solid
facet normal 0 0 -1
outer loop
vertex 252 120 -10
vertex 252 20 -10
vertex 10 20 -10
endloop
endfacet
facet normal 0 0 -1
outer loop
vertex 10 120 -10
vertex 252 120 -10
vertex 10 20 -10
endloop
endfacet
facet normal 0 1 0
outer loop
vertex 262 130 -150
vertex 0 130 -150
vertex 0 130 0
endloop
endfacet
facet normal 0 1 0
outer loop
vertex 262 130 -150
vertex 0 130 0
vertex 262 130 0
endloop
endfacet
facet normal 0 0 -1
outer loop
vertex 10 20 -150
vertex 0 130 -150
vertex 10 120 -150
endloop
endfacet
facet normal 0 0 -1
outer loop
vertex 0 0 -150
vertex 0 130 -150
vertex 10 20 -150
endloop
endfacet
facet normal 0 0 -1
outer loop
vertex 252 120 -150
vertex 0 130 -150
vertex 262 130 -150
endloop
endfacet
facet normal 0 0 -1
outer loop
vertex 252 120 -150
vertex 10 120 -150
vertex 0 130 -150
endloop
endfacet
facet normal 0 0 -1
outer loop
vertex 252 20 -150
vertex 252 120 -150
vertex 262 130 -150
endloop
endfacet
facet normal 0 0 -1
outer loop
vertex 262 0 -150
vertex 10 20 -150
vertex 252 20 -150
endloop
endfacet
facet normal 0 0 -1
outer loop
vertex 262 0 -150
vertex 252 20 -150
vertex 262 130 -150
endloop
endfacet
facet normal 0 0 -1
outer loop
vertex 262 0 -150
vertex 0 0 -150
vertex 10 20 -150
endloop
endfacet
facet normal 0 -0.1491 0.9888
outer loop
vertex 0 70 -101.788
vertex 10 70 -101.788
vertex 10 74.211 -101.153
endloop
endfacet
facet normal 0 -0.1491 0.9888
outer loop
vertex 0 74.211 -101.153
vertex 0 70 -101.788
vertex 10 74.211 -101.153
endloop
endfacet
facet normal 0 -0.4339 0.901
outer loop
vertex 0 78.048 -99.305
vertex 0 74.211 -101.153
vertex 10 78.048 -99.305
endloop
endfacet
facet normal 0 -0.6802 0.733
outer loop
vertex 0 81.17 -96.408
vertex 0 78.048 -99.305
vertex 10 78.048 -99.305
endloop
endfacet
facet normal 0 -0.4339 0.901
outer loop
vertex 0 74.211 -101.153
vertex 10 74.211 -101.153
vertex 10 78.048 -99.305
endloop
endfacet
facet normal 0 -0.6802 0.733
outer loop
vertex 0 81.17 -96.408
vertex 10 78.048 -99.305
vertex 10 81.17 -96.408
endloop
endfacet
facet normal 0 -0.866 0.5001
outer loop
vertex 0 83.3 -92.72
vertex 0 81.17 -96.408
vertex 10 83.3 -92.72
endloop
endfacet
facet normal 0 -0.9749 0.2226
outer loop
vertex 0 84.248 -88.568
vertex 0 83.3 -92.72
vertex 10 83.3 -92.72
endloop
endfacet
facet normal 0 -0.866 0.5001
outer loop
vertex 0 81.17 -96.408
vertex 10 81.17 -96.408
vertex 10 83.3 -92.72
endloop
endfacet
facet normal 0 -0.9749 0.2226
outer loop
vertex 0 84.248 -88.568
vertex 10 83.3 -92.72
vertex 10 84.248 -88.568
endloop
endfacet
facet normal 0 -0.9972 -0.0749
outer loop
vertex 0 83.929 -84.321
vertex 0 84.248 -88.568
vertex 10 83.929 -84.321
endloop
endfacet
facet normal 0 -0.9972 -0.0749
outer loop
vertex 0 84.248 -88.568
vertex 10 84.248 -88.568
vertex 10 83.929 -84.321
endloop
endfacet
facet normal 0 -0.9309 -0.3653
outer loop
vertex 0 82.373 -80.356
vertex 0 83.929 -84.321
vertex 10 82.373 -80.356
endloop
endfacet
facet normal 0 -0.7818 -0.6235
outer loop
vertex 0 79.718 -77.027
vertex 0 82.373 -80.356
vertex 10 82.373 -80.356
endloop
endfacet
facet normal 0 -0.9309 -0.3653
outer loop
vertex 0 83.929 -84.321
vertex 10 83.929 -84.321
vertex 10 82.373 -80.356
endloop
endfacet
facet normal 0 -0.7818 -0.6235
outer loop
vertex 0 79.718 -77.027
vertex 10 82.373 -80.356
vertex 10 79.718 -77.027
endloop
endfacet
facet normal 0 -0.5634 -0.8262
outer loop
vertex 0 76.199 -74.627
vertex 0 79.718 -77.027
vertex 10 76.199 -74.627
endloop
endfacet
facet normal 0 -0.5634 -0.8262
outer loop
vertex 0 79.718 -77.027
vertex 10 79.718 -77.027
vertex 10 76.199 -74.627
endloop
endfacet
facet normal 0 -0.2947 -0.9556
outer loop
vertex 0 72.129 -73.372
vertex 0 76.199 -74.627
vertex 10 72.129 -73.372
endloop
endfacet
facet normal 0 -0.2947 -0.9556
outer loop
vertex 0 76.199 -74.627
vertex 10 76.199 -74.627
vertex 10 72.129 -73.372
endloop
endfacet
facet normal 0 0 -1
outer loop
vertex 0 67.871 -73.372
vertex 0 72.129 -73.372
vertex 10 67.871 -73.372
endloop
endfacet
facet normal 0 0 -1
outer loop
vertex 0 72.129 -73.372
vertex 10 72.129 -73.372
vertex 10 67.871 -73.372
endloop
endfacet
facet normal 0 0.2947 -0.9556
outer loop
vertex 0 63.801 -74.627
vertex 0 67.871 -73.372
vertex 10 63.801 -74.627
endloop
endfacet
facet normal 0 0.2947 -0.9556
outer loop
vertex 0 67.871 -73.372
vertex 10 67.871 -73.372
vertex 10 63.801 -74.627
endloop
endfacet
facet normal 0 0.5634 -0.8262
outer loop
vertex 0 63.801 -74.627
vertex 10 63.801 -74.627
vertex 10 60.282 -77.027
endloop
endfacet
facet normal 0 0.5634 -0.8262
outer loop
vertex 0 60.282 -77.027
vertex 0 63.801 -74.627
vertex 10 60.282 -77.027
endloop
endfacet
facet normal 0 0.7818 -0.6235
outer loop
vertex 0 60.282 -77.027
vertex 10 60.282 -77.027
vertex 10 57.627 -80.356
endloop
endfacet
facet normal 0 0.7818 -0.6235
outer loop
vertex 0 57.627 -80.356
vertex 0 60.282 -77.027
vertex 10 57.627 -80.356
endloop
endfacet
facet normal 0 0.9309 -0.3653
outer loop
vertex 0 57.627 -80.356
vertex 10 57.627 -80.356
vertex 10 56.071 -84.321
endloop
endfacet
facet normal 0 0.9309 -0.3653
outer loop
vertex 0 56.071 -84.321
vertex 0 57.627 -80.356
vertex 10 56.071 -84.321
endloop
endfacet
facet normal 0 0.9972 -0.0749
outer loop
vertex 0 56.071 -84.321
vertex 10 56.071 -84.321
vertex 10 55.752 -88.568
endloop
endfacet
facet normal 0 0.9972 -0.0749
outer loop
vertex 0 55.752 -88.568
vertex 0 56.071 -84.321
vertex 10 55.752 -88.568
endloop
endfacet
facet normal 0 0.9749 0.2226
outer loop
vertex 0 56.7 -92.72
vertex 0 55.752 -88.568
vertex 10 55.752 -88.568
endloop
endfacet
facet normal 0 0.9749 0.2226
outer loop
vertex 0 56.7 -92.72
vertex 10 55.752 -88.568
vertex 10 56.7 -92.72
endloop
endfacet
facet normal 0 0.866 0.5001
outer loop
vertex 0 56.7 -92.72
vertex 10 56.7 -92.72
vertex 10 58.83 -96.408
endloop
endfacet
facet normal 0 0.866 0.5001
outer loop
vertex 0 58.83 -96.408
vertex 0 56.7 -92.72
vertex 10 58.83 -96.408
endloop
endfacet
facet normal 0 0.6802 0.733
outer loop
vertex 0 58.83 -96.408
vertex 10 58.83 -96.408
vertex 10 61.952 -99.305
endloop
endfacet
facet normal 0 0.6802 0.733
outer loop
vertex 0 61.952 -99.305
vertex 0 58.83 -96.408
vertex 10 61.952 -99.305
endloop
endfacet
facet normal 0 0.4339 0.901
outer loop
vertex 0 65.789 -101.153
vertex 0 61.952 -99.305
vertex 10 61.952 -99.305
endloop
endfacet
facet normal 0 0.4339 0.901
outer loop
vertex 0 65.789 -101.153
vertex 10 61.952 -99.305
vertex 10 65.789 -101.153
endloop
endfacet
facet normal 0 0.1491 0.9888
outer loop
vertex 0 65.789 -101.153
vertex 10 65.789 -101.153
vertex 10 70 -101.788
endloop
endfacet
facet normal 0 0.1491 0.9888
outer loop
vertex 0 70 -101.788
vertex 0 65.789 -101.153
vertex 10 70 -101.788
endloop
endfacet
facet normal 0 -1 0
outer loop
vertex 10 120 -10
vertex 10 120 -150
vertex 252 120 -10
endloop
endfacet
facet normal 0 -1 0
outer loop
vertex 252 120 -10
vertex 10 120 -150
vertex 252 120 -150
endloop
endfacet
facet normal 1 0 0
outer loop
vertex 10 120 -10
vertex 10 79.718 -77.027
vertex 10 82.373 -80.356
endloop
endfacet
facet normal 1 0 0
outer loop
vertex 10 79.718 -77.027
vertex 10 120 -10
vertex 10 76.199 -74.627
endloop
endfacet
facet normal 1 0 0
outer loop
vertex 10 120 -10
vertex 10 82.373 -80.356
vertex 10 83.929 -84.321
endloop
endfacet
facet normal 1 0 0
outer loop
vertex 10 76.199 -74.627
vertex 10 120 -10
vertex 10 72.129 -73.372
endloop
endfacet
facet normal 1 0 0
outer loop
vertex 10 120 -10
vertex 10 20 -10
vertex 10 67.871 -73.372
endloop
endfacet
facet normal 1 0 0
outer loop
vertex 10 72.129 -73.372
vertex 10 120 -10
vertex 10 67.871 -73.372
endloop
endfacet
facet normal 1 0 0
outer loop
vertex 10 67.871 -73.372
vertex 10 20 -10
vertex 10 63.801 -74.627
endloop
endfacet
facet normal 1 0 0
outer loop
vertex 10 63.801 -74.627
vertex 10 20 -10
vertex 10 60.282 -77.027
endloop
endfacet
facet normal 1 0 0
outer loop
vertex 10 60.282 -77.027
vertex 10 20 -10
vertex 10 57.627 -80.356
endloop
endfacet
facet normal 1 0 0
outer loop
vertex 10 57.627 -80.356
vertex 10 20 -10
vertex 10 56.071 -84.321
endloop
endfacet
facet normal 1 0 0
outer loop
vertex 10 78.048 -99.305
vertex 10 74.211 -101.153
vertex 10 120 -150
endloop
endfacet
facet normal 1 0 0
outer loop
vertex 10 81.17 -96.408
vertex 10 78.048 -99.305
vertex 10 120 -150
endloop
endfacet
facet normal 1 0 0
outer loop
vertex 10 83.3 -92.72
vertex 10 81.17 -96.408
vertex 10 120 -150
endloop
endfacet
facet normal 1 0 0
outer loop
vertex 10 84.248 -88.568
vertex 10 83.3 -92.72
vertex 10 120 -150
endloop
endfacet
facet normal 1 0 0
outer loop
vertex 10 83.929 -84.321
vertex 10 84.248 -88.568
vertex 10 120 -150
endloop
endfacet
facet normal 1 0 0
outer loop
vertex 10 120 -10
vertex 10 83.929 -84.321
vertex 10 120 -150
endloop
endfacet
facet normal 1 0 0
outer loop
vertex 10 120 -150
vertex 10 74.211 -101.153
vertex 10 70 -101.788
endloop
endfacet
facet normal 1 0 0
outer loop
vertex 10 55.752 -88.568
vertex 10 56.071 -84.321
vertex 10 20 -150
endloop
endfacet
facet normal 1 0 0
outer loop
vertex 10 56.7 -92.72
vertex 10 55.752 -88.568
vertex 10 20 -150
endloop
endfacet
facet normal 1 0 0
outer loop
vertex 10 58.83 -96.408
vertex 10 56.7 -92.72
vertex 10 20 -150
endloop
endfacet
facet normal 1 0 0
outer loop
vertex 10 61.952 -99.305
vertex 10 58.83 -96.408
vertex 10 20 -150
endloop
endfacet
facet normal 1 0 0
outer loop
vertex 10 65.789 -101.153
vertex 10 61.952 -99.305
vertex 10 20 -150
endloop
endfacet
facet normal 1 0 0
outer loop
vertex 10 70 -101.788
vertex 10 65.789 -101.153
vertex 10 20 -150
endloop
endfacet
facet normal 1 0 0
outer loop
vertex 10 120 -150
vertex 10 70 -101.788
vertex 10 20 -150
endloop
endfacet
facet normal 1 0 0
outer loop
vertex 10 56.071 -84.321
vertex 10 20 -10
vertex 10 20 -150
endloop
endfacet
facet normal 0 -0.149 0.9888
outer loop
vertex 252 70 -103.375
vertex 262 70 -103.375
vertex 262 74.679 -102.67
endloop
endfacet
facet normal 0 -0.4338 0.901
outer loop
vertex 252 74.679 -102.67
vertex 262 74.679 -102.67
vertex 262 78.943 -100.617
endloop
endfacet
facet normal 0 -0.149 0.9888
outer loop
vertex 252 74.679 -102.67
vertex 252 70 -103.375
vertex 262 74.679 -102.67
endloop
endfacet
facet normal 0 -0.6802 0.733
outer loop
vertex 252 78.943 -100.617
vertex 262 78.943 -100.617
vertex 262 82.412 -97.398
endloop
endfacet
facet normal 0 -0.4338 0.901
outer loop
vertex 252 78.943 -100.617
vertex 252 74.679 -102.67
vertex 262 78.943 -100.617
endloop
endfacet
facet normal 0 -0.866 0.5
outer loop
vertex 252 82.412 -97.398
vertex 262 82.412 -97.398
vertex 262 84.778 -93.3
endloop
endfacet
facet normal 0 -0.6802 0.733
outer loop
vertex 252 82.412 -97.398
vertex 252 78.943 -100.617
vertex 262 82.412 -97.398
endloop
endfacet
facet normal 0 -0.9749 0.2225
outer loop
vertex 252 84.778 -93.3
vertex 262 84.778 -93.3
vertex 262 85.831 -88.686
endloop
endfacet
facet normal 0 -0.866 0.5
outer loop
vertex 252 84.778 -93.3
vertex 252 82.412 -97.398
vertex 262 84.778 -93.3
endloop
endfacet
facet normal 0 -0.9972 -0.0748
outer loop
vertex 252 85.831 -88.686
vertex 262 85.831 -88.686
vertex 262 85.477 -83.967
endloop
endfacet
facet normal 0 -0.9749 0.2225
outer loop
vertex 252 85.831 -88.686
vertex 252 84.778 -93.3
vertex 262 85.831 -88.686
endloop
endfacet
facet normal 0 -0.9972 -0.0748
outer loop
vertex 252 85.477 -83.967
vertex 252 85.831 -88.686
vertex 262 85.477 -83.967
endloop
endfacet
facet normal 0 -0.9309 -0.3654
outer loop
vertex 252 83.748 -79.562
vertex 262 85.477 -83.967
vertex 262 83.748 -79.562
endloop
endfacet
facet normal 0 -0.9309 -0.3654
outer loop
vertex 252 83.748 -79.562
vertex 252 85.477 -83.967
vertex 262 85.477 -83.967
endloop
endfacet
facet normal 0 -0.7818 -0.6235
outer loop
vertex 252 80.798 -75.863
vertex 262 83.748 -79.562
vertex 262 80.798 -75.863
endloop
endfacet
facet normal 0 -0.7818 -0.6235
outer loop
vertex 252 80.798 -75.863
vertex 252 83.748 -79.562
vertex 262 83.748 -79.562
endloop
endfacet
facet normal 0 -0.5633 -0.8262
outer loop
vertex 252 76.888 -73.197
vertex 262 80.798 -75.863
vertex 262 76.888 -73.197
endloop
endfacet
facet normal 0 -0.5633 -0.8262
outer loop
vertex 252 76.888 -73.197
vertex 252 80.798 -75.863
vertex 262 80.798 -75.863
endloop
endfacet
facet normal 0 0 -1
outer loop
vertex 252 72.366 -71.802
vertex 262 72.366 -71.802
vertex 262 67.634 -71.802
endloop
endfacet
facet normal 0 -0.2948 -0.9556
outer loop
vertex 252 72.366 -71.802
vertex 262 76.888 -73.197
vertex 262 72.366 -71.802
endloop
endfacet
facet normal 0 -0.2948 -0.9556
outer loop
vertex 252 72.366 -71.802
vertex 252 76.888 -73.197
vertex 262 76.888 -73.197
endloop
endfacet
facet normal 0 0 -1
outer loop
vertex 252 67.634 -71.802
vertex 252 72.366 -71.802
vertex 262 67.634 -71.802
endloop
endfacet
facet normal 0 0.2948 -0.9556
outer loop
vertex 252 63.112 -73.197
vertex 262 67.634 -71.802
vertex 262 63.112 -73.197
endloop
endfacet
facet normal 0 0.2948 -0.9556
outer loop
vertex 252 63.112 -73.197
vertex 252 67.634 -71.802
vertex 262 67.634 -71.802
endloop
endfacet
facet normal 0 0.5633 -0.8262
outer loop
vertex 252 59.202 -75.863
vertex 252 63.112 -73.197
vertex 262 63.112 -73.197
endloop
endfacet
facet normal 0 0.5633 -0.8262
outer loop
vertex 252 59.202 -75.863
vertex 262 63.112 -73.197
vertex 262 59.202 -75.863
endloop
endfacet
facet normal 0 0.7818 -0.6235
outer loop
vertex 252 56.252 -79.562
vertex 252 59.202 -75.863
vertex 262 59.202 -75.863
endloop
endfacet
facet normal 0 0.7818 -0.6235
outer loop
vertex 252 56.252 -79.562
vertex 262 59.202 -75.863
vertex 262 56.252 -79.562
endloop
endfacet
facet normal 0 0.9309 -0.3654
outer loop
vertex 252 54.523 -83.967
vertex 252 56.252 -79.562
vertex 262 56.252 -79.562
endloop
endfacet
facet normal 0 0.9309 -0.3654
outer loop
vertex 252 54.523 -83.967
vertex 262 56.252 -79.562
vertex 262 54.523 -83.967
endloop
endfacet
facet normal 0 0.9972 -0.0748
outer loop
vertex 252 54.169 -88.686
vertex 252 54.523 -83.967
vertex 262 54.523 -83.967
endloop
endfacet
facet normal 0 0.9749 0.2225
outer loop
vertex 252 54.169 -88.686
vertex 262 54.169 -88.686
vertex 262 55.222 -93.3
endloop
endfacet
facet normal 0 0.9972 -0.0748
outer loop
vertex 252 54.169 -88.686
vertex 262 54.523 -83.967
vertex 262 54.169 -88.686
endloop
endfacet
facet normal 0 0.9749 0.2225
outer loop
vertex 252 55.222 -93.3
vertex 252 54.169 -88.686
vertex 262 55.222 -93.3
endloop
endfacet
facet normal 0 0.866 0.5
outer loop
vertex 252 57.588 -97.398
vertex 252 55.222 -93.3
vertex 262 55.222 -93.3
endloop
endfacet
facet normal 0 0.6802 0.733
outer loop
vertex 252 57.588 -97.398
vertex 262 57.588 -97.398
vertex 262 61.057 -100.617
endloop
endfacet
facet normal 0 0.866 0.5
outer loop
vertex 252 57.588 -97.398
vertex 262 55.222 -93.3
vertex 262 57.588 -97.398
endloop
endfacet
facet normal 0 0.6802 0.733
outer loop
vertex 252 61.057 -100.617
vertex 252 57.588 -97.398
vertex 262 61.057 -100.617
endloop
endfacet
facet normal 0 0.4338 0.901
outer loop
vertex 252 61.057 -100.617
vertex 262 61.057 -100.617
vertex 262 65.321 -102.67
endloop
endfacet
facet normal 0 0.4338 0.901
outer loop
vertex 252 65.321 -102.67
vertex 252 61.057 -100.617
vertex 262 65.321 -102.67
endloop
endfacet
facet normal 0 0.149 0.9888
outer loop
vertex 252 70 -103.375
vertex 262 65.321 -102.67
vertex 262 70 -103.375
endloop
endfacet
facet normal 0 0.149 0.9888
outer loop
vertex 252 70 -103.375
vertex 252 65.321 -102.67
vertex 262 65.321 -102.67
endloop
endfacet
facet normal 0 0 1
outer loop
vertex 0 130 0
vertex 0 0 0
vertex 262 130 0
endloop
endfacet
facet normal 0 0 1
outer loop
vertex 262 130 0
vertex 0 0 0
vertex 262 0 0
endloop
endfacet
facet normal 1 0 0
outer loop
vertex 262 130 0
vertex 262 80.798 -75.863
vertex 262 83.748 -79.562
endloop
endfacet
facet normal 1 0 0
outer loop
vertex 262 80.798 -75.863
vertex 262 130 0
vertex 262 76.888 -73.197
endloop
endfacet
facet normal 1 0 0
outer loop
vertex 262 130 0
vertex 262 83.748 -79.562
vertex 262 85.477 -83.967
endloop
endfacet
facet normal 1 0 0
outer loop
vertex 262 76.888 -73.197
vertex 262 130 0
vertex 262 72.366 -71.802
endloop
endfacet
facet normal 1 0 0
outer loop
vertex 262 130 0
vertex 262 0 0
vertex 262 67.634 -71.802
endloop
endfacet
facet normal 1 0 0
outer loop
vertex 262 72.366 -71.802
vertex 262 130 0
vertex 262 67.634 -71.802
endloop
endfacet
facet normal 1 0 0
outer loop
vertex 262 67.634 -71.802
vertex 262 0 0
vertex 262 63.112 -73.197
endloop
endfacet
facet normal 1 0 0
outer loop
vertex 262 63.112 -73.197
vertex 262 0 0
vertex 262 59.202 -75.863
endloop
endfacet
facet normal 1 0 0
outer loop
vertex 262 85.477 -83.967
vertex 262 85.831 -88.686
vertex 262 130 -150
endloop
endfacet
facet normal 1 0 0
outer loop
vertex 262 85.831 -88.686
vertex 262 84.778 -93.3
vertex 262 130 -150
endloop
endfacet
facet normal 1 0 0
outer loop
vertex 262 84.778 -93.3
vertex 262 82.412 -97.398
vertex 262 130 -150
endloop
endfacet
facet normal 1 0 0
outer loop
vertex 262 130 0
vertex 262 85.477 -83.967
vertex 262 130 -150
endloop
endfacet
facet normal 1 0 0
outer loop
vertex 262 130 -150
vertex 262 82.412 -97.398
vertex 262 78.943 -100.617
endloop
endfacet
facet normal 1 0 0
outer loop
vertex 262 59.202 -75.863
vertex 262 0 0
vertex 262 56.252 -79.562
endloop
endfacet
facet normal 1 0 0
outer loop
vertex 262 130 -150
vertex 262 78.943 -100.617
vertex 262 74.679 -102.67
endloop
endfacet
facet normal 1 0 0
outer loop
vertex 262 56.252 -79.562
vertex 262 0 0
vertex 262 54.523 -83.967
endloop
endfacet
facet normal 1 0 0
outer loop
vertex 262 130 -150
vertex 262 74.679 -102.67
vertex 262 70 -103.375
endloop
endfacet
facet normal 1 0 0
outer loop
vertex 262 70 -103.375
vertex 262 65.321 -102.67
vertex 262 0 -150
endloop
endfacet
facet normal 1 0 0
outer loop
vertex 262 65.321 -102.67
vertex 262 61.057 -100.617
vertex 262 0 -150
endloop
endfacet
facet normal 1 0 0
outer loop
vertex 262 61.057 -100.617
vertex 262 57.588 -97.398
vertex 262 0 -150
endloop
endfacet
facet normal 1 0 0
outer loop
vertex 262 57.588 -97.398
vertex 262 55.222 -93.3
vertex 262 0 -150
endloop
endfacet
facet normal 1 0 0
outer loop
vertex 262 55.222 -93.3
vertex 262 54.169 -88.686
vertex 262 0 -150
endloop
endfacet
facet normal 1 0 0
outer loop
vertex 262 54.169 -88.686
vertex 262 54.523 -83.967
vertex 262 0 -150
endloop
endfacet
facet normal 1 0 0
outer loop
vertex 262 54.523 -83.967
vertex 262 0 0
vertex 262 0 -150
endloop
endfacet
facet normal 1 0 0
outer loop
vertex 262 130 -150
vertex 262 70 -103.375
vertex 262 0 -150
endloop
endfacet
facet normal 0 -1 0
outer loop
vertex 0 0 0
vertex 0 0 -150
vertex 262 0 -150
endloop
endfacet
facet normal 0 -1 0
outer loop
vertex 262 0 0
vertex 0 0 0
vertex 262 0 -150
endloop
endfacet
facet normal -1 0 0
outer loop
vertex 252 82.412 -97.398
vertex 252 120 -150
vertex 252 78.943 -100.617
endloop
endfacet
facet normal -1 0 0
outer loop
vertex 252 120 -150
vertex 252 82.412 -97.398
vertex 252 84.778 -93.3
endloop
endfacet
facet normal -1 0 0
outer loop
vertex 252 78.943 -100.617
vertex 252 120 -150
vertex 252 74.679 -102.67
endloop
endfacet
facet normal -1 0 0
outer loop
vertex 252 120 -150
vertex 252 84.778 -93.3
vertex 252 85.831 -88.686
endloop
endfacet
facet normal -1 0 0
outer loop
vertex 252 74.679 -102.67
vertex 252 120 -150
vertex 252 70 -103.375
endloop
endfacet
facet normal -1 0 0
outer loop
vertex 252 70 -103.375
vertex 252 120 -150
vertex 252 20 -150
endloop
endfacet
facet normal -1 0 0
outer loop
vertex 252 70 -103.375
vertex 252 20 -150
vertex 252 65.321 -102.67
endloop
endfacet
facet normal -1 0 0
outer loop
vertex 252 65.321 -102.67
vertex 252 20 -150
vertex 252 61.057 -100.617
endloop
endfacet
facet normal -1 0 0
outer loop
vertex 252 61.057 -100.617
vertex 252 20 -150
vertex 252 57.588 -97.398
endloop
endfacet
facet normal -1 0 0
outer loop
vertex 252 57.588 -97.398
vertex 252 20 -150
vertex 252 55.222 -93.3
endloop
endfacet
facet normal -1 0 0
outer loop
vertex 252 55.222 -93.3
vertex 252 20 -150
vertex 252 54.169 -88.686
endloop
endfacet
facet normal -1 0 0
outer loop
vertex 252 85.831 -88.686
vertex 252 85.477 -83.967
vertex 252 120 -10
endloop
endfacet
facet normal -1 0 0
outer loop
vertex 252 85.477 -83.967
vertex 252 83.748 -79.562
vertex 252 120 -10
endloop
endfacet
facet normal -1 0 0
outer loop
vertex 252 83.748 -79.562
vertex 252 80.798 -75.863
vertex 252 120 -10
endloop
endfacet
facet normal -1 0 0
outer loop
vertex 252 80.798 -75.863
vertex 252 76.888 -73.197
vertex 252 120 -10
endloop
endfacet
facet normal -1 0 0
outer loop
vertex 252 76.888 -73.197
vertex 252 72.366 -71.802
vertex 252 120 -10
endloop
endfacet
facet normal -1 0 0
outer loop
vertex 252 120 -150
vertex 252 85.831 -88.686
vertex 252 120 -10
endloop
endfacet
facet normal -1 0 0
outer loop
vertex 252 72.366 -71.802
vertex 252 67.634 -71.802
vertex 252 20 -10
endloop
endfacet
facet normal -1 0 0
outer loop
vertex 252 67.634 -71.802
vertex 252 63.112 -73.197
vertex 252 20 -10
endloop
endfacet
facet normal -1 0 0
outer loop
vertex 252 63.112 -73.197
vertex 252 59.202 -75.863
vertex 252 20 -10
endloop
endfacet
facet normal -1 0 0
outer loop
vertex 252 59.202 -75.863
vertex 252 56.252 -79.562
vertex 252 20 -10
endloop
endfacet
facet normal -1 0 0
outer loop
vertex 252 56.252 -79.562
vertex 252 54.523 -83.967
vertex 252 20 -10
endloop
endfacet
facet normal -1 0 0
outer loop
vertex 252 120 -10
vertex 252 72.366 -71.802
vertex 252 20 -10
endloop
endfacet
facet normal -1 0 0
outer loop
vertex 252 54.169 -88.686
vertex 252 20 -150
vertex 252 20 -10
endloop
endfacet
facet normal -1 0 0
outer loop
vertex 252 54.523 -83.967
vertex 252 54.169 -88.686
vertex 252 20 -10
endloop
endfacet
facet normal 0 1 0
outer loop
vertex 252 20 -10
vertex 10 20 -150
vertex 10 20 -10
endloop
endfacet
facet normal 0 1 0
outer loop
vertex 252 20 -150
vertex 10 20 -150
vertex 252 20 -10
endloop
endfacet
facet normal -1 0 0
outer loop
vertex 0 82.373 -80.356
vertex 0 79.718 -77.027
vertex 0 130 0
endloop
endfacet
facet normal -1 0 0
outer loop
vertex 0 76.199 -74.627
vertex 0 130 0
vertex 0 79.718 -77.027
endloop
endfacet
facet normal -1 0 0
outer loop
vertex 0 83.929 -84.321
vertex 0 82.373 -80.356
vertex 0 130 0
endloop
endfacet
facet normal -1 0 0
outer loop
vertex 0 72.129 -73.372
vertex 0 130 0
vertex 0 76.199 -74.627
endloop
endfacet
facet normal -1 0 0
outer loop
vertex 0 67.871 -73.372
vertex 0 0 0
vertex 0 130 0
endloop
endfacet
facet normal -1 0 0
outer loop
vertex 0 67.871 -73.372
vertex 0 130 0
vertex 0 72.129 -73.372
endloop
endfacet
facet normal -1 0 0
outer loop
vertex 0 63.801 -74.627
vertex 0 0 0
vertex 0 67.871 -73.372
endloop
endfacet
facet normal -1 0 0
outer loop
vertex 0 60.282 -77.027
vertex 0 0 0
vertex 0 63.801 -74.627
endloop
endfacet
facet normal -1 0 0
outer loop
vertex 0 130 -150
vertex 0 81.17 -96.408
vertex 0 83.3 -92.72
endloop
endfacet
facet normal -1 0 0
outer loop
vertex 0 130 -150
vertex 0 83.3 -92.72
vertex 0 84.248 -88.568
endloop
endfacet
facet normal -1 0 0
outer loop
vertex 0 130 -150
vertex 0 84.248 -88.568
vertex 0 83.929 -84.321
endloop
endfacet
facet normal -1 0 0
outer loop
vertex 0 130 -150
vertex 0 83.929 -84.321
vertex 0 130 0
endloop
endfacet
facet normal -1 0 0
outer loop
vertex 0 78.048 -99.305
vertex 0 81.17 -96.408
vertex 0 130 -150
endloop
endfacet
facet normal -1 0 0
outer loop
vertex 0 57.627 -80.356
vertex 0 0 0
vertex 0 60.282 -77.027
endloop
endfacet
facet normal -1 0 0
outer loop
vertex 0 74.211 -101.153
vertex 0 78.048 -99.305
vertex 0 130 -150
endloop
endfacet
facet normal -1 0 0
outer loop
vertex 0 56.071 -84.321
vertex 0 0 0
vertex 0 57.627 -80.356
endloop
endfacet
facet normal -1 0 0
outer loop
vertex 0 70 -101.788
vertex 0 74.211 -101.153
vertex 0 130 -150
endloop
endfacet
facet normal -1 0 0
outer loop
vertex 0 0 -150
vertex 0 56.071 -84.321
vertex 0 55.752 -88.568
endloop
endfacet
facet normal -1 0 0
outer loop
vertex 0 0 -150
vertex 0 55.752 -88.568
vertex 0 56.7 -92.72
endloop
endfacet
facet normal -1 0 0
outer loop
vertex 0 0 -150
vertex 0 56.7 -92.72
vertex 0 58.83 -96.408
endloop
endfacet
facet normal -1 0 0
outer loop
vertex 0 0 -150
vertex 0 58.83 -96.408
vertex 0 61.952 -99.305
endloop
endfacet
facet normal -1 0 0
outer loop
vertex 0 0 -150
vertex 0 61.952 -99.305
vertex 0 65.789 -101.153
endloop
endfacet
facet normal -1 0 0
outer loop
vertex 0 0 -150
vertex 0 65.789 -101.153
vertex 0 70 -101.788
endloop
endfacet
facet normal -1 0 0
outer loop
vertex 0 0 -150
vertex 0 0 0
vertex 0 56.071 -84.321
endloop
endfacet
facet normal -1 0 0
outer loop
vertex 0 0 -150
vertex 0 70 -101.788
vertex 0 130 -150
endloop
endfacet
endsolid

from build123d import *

# Parameters (mm, degrees)
SKETCH1_W           = 262
SKETCH1_H           = 150
BOSS_EXTRUDE1_DEPTH = 20
BOSS_EXTRUDE2_DEPTH = 100
SKETCH3_R           = 14.2875
CUT_EXTRUDE1_DEPTH  = 11
SKETCH4_R           = 15.875
CUT_EXTRUDE2_DEPTH  = 11
SKETCH5_W           = 262
SKETCH5_H           = 150
BOSS_EXTRUDE4_DEPTH = 10


with BuildPart() as part:
    # Sketch1 → Boss-Extrude1 (new body)
    with BuildSketch(Plane(origin=(0, 0, 0), x_dir=(1, 0, 0), z_dir=(0, 1, 0))):
        with Locations((131, 75)):
            Rectangle(SKETCH1_W, SKETCH1_H)
    extrude(amount=BOSS_EXTRUDE1_DEPTH)

    # Sketch2 → Boss-Extrude2 (add)
    with BuildSketch(Plane(origin=(0, 20, 0), x_dir=(1, 0, 0), z_dir=(0, 1, 0))):
        Polygon((0, 0), (262, 0), (262, 150), (252, 150), (252, 10), (10, 10), (10, 150), (0, 150), align=None)
    extrude(amount=BOSS_EXTRUDE2_DEPTH)

    # Sketch3 → Cut-Extrude1 (cut, through all)
    with BuildSketch(Plane(origin=(10, 0, 0), x_dir=(0, 0, -1), z_dir=(1, 0, 0))):
        with Locations((87.5, 70)):
            Circle(SKETCH3_R)
    extrude(amount=-CUT_EXTRUDE1_DEPTH, mode=Mode.SUBTRACT)

    # Sketch4 → Cut-Extrude2 (cut, through all)
    with BuildSketch(Plane(origin=(252, 0, 0), x_dir=(0, 0, -1), z_dir=(1, 0, 0))):
        with Locations((87.5, 70)):
            Circle(SKETCH4_R)
    extrude(amount=CUT_EXTRUDE2_DEPTH, mode=Mode.SUBTRACT)

    # Sketch5 → Boss-Extrude4 (add)
    with BuildSketch(Plane(origin=(0, 120, 0), x_dir=(1, 0, 0), z_dir=(0, 1, 0))):
        with Locations((131, 75)):
            Rectangle(SKETCH5_W, SKETCH5_H)
    extrude(amount=BOSS_EXTRUDE4_DEPTH)


solid = part.part
